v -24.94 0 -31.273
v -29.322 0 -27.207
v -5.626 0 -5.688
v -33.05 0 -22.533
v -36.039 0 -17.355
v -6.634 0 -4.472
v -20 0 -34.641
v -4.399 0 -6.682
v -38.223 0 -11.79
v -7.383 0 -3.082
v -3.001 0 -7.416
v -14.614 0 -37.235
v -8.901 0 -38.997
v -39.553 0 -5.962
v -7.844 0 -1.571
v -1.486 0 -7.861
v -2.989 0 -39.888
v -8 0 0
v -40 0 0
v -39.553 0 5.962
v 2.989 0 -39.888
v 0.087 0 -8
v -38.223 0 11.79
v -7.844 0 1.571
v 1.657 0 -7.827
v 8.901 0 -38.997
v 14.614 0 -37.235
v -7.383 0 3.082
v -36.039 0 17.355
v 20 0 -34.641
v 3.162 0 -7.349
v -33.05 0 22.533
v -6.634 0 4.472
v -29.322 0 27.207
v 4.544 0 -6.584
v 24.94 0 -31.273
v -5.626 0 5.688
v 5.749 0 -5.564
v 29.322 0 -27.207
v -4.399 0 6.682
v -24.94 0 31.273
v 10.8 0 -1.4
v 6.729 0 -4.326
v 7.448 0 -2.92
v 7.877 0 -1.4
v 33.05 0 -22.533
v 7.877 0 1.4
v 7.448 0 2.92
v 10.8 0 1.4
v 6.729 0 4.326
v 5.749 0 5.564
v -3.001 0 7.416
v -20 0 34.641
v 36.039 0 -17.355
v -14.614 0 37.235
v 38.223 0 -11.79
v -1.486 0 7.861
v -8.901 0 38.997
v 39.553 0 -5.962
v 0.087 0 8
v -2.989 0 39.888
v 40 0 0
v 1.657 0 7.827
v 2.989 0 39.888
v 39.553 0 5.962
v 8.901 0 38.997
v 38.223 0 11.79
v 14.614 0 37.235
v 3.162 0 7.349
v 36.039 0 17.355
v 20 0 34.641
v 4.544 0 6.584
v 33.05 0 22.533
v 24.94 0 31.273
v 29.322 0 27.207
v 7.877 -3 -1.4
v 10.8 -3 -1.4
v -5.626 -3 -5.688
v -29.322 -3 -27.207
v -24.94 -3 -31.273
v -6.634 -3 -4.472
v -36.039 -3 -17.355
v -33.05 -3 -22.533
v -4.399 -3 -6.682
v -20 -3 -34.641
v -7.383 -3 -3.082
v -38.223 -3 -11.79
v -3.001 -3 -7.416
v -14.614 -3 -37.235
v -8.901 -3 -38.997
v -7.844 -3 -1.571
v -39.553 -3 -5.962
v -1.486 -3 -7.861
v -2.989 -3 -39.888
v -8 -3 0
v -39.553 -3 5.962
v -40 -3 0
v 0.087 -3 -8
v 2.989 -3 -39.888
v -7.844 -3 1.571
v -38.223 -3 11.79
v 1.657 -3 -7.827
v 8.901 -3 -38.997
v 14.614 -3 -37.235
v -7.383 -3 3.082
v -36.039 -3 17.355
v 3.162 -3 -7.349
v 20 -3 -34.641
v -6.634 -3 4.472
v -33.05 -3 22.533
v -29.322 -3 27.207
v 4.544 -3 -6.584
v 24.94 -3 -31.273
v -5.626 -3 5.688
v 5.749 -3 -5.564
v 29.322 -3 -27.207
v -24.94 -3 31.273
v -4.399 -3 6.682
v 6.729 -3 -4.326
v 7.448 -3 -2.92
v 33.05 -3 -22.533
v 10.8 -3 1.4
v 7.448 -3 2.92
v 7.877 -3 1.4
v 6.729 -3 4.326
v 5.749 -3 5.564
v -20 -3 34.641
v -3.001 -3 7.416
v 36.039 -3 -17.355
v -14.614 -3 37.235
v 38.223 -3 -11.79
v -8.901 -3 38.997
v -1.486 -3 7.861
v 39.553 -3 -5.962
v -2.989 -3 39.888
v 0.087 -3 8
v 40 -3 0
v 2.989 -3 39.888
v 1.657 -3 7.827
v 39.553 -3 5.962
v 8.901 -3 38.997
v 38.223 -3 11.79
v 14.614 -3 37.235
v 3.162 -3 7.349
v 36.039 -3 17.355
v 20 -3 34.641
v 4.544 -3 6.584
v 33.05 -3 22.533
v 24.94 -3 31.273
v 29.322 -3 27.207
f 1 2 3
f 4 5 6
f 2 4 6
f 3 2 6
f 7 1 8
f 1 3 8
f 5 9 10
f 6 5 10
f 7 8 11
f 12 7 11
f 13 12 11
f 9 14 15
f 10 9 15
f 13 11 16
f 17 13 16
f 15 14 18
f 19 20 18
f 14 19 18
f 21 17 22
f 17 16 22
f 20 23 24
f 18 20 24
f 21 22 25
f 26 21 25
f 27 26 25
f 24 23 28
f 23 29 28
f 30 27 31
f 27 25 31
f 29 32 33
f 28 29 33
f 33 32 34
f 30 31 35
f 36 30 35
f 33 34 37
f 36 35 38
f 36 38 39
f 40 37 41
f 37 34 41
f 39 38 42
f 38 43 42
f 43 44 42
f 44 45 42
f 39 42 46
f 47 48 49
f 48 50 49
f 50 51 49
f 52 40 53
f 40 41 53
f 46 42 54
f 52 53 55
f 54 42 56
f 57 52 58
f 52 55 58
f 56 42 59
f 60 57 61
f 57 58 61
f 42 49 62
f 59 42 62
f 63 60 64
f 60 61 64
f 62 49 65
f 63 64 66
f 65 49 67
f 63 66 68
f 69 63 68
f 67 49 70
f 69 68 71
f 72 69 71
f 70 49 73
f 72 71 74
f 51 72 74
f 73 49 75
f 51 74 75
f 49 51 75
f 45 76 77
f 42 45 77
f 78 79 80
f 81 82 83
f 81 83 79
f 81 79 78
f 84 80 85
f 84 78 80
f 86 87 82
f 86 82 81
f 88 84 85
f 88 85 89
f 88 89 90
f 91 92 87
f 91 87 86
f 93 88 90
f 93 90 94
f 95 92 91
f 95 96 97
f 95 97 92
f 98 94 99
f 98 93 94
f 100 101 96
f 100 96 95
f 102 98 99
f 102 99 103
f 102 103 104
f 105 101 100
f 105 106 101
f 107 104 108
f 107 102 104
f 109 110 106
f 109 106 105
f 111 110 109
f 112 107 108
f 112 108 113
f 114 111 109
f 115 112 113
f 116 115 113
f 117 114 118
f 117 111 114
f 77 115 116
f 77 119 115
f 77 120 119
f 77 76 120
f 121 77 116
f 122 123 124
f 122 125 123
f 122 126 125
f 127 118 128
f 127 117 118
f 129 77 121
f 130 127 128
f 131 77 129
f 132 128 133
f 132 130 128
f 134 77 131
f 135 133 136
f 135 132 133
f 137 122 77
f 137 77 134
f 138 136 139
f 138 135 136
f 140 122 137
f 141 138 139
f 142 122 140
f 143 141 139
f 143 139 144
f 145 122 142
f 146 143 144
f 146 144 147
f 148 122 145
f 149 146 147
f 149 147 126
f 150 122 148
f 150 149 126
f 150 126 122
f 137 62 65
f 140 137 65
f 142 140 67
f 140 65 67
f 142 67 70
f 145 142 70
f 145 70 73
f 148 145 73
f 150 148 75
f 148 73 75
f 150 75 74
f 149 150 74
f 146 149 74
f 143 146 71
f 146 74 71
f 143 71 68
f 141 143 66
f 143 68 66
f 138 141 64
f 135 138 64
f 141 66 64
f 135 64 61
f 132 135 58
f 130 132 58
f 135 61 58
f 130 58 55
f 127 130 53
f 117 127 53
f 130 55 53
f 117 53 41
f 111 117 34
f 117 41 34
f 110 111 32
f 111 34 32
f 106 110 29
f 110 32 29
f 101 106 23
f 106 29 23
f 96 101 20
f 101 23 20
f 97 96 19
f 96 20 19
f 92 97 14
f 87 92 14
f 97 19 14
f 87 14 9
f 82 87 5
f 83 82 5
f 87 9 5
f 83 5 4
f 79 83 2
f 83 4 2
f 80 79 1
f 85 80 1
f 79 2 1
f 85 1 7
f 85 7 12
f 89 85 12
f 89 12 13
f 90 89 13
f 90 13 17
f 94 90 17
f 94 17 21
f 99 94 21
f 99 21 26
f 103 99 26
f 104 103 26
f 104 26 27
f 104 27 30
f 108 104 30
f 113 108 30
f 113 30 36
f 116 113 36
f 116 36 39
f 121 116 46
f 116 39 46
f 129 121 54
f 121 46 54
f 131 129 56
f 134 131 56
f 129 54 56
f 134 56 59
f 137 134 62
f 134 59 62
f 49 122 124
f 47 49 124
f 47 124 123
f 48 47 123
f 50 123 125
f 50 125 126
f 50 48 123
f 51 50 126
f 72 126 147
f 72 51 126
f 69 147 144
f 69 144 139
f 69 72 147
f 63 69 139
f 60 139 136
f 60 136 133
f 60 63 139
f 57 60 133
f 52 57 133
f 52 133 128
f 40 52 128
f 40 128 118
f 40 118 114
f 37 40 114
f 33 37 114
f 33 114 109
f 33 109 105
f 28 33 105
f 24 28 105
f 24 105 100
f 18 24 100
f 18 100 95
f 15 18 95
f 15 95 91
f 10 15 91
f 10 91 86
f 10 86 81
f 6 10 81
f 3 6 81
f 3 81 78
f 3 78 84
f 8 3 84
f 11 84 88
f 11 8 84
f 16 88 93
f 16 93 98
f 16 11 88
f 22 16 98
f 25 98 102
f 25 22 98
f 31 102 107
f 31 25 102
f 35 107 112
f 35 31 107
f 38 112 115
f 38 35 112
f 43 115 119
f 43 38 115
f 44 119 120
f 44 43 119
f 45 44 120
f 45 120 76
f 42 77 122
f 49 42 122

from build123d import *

# Parameters (mm, degrees)
F0_R     = 40
F0_R_2   = 8
F1_DEPTH = 3
F3_DEPTH = 3


with BuildPart() as f1:
    # F0 (on Front) → F1 (new body)
    with BuildSketch(Plane.XZ):
        Circle(F0_R)
        Circle(F0_R_2, mode=Mode.SUBTRACT)
    extrude(amount=F1_DEPTH)

    # F2 (on face) → F3 (cut, through all)
    with BuildSketch(Plane.XZ.offset(3)):
        with BuildLine():
            Line((10.8, -1.4), (10.8, 1.4))
            Line((10.8, 1.4), (7.876547, 1.4))
            ThreePointArc((7.876547, 1.4), (7.969077, 0.702716), (8, 0))
            ThreePointArc((8, 0), (7.969077, -0.702716), (7.876547, -1.4))
            Line((7.876547, -1.4), (10.8, -1.4))
        make_face()
    extrude(amount=-F3_DEPTH, mode=Mode.SUBTRACT)


solid = f1.part
